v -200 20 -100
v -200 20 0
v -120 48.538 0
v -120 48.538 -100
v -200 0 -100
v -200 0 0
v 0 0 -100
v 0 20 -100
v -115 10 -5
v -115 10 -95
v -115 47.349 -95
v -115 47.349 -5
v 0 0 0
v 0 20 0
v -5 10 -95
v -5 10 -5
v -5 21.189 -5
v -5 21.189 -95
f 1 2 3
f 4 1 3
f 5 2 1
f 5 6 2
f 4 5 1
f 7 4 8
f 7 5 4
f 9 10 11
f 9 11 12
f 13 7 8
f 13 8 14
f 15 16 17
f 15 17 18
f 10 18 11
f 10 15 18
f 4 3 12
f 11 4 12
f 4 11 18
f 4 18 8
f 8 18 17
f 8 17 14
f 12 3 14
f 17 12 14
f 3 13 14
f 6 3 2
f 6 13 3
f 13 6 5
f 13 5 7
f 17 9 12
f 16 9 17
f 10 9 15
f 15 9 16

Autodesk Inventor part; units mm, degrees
ref_plane "YZ Plane" through (0, 0, 0) normal (1, 0, 0) x (0, 1, 0)
ref_plane "XZ Plane" through (0, 0, 0) normal (0, 1, 0) x (-1, 0, 0)
ref_plane "XY Plane" through (0, 0, 0) normal (0, 0, 1) x (1, 0, 0)
sketch "Sketch1" plane through (0, 0, 0) normal (0, 1, 0) x (-1, 0, 0)
  line L0 (0, 0) -> (200, 0)
  line L1 (200, 0) -> (200, -100)
  line L2 (200, -100) -> (0, -100)
  line L3 (0, -100) -> (0, 0)
  dimension "d0" = 200
  dimension "d1" = 100
extrude "Extrusion1" add sketch "Sketch1" along normal blind 20
sketch "Sketch2" plane through (-200, 0, 0) normal (0, 0, 1) x (1, 0, 0)
  line L0 (0, 0) -> (0, 20) projected
  line L1 (0, 0) -> (32, 0)
  line L2 (32, 0) -> (64, 0)
  line L3 (200, 0) -> (0, 0) projected
  line L4 (64, 0) -> (96, 0)
  line L5 (96, 0) -> (128, 0)
  line L6 (128, 0) -> (200, 0)
  line L7 (64, 0) -> (64, 80.3945) construction
  line L8 (200, 20) -> (0, 20) projected
  line L9 (0, 20) -> (200, 20)
  line L10 (0, 20) -> (200, 20) projected
  line L11 (0, 20) -> (200, 20)
  line L12 (0, 20) -> (80, 48.5382)
  line L13 (80, 48.5382) -> (200, 20)
extrude "Extrusion2" add sketch "Sketch2" against normal blind 100
sketch "Sketch4" plane through (0, 0, 0) normal (0, -1, 0) x (1, 0, 0)
  line L0 (0, 0) -> (-5, 0)
  line L1 (-5, 0) -> (-5, -5)
  line L2 (-5, -5) -> (0, -5)
  line L3 (0, -5) -> (0, 0)
  line L4 (-120, 0) -> (-120, -100) projected
  line L5 (-120, 0) -> (-115, 0)
  line L6 (-115, 0) -> (-115, -5)
  line L7 (-115, -5) -> (-120, -5)
  line L8 (-120, -5) -> (-120, 0)
  line L9 (-120, -100) -> (-115, -100)
  line L10 (-115, -100) -> (-115, -95)
  line L11 (-115, -95) -> (-120, -95)
  line L12 (-120, -95) -> (-120, -100)
  line L13 (-115, -5) -> (-5, -5)
  line L14 (-5, -5) -> (-5, -95)
  line L15 (-5, -95) -> (-115, -95)
  line L16 (-115, -95) -> (-115, -5)
  dimension "d23" = 5
  dimension "d24" = 5
  dimension "d25" = 5
  dimension "d26" = 5
  dimension "d27" = 5
  dimension "d28" = 5
extrude "Extrusion3" cut sketch "Sketch4" against normal blind 68.75 contours L14 L15 L16 L13
extrude "Extrusion4" add sketch "Sketch4" against normal blind 10 contours L14 L15 L16 L13
properties part number "Cybertruck 1"
